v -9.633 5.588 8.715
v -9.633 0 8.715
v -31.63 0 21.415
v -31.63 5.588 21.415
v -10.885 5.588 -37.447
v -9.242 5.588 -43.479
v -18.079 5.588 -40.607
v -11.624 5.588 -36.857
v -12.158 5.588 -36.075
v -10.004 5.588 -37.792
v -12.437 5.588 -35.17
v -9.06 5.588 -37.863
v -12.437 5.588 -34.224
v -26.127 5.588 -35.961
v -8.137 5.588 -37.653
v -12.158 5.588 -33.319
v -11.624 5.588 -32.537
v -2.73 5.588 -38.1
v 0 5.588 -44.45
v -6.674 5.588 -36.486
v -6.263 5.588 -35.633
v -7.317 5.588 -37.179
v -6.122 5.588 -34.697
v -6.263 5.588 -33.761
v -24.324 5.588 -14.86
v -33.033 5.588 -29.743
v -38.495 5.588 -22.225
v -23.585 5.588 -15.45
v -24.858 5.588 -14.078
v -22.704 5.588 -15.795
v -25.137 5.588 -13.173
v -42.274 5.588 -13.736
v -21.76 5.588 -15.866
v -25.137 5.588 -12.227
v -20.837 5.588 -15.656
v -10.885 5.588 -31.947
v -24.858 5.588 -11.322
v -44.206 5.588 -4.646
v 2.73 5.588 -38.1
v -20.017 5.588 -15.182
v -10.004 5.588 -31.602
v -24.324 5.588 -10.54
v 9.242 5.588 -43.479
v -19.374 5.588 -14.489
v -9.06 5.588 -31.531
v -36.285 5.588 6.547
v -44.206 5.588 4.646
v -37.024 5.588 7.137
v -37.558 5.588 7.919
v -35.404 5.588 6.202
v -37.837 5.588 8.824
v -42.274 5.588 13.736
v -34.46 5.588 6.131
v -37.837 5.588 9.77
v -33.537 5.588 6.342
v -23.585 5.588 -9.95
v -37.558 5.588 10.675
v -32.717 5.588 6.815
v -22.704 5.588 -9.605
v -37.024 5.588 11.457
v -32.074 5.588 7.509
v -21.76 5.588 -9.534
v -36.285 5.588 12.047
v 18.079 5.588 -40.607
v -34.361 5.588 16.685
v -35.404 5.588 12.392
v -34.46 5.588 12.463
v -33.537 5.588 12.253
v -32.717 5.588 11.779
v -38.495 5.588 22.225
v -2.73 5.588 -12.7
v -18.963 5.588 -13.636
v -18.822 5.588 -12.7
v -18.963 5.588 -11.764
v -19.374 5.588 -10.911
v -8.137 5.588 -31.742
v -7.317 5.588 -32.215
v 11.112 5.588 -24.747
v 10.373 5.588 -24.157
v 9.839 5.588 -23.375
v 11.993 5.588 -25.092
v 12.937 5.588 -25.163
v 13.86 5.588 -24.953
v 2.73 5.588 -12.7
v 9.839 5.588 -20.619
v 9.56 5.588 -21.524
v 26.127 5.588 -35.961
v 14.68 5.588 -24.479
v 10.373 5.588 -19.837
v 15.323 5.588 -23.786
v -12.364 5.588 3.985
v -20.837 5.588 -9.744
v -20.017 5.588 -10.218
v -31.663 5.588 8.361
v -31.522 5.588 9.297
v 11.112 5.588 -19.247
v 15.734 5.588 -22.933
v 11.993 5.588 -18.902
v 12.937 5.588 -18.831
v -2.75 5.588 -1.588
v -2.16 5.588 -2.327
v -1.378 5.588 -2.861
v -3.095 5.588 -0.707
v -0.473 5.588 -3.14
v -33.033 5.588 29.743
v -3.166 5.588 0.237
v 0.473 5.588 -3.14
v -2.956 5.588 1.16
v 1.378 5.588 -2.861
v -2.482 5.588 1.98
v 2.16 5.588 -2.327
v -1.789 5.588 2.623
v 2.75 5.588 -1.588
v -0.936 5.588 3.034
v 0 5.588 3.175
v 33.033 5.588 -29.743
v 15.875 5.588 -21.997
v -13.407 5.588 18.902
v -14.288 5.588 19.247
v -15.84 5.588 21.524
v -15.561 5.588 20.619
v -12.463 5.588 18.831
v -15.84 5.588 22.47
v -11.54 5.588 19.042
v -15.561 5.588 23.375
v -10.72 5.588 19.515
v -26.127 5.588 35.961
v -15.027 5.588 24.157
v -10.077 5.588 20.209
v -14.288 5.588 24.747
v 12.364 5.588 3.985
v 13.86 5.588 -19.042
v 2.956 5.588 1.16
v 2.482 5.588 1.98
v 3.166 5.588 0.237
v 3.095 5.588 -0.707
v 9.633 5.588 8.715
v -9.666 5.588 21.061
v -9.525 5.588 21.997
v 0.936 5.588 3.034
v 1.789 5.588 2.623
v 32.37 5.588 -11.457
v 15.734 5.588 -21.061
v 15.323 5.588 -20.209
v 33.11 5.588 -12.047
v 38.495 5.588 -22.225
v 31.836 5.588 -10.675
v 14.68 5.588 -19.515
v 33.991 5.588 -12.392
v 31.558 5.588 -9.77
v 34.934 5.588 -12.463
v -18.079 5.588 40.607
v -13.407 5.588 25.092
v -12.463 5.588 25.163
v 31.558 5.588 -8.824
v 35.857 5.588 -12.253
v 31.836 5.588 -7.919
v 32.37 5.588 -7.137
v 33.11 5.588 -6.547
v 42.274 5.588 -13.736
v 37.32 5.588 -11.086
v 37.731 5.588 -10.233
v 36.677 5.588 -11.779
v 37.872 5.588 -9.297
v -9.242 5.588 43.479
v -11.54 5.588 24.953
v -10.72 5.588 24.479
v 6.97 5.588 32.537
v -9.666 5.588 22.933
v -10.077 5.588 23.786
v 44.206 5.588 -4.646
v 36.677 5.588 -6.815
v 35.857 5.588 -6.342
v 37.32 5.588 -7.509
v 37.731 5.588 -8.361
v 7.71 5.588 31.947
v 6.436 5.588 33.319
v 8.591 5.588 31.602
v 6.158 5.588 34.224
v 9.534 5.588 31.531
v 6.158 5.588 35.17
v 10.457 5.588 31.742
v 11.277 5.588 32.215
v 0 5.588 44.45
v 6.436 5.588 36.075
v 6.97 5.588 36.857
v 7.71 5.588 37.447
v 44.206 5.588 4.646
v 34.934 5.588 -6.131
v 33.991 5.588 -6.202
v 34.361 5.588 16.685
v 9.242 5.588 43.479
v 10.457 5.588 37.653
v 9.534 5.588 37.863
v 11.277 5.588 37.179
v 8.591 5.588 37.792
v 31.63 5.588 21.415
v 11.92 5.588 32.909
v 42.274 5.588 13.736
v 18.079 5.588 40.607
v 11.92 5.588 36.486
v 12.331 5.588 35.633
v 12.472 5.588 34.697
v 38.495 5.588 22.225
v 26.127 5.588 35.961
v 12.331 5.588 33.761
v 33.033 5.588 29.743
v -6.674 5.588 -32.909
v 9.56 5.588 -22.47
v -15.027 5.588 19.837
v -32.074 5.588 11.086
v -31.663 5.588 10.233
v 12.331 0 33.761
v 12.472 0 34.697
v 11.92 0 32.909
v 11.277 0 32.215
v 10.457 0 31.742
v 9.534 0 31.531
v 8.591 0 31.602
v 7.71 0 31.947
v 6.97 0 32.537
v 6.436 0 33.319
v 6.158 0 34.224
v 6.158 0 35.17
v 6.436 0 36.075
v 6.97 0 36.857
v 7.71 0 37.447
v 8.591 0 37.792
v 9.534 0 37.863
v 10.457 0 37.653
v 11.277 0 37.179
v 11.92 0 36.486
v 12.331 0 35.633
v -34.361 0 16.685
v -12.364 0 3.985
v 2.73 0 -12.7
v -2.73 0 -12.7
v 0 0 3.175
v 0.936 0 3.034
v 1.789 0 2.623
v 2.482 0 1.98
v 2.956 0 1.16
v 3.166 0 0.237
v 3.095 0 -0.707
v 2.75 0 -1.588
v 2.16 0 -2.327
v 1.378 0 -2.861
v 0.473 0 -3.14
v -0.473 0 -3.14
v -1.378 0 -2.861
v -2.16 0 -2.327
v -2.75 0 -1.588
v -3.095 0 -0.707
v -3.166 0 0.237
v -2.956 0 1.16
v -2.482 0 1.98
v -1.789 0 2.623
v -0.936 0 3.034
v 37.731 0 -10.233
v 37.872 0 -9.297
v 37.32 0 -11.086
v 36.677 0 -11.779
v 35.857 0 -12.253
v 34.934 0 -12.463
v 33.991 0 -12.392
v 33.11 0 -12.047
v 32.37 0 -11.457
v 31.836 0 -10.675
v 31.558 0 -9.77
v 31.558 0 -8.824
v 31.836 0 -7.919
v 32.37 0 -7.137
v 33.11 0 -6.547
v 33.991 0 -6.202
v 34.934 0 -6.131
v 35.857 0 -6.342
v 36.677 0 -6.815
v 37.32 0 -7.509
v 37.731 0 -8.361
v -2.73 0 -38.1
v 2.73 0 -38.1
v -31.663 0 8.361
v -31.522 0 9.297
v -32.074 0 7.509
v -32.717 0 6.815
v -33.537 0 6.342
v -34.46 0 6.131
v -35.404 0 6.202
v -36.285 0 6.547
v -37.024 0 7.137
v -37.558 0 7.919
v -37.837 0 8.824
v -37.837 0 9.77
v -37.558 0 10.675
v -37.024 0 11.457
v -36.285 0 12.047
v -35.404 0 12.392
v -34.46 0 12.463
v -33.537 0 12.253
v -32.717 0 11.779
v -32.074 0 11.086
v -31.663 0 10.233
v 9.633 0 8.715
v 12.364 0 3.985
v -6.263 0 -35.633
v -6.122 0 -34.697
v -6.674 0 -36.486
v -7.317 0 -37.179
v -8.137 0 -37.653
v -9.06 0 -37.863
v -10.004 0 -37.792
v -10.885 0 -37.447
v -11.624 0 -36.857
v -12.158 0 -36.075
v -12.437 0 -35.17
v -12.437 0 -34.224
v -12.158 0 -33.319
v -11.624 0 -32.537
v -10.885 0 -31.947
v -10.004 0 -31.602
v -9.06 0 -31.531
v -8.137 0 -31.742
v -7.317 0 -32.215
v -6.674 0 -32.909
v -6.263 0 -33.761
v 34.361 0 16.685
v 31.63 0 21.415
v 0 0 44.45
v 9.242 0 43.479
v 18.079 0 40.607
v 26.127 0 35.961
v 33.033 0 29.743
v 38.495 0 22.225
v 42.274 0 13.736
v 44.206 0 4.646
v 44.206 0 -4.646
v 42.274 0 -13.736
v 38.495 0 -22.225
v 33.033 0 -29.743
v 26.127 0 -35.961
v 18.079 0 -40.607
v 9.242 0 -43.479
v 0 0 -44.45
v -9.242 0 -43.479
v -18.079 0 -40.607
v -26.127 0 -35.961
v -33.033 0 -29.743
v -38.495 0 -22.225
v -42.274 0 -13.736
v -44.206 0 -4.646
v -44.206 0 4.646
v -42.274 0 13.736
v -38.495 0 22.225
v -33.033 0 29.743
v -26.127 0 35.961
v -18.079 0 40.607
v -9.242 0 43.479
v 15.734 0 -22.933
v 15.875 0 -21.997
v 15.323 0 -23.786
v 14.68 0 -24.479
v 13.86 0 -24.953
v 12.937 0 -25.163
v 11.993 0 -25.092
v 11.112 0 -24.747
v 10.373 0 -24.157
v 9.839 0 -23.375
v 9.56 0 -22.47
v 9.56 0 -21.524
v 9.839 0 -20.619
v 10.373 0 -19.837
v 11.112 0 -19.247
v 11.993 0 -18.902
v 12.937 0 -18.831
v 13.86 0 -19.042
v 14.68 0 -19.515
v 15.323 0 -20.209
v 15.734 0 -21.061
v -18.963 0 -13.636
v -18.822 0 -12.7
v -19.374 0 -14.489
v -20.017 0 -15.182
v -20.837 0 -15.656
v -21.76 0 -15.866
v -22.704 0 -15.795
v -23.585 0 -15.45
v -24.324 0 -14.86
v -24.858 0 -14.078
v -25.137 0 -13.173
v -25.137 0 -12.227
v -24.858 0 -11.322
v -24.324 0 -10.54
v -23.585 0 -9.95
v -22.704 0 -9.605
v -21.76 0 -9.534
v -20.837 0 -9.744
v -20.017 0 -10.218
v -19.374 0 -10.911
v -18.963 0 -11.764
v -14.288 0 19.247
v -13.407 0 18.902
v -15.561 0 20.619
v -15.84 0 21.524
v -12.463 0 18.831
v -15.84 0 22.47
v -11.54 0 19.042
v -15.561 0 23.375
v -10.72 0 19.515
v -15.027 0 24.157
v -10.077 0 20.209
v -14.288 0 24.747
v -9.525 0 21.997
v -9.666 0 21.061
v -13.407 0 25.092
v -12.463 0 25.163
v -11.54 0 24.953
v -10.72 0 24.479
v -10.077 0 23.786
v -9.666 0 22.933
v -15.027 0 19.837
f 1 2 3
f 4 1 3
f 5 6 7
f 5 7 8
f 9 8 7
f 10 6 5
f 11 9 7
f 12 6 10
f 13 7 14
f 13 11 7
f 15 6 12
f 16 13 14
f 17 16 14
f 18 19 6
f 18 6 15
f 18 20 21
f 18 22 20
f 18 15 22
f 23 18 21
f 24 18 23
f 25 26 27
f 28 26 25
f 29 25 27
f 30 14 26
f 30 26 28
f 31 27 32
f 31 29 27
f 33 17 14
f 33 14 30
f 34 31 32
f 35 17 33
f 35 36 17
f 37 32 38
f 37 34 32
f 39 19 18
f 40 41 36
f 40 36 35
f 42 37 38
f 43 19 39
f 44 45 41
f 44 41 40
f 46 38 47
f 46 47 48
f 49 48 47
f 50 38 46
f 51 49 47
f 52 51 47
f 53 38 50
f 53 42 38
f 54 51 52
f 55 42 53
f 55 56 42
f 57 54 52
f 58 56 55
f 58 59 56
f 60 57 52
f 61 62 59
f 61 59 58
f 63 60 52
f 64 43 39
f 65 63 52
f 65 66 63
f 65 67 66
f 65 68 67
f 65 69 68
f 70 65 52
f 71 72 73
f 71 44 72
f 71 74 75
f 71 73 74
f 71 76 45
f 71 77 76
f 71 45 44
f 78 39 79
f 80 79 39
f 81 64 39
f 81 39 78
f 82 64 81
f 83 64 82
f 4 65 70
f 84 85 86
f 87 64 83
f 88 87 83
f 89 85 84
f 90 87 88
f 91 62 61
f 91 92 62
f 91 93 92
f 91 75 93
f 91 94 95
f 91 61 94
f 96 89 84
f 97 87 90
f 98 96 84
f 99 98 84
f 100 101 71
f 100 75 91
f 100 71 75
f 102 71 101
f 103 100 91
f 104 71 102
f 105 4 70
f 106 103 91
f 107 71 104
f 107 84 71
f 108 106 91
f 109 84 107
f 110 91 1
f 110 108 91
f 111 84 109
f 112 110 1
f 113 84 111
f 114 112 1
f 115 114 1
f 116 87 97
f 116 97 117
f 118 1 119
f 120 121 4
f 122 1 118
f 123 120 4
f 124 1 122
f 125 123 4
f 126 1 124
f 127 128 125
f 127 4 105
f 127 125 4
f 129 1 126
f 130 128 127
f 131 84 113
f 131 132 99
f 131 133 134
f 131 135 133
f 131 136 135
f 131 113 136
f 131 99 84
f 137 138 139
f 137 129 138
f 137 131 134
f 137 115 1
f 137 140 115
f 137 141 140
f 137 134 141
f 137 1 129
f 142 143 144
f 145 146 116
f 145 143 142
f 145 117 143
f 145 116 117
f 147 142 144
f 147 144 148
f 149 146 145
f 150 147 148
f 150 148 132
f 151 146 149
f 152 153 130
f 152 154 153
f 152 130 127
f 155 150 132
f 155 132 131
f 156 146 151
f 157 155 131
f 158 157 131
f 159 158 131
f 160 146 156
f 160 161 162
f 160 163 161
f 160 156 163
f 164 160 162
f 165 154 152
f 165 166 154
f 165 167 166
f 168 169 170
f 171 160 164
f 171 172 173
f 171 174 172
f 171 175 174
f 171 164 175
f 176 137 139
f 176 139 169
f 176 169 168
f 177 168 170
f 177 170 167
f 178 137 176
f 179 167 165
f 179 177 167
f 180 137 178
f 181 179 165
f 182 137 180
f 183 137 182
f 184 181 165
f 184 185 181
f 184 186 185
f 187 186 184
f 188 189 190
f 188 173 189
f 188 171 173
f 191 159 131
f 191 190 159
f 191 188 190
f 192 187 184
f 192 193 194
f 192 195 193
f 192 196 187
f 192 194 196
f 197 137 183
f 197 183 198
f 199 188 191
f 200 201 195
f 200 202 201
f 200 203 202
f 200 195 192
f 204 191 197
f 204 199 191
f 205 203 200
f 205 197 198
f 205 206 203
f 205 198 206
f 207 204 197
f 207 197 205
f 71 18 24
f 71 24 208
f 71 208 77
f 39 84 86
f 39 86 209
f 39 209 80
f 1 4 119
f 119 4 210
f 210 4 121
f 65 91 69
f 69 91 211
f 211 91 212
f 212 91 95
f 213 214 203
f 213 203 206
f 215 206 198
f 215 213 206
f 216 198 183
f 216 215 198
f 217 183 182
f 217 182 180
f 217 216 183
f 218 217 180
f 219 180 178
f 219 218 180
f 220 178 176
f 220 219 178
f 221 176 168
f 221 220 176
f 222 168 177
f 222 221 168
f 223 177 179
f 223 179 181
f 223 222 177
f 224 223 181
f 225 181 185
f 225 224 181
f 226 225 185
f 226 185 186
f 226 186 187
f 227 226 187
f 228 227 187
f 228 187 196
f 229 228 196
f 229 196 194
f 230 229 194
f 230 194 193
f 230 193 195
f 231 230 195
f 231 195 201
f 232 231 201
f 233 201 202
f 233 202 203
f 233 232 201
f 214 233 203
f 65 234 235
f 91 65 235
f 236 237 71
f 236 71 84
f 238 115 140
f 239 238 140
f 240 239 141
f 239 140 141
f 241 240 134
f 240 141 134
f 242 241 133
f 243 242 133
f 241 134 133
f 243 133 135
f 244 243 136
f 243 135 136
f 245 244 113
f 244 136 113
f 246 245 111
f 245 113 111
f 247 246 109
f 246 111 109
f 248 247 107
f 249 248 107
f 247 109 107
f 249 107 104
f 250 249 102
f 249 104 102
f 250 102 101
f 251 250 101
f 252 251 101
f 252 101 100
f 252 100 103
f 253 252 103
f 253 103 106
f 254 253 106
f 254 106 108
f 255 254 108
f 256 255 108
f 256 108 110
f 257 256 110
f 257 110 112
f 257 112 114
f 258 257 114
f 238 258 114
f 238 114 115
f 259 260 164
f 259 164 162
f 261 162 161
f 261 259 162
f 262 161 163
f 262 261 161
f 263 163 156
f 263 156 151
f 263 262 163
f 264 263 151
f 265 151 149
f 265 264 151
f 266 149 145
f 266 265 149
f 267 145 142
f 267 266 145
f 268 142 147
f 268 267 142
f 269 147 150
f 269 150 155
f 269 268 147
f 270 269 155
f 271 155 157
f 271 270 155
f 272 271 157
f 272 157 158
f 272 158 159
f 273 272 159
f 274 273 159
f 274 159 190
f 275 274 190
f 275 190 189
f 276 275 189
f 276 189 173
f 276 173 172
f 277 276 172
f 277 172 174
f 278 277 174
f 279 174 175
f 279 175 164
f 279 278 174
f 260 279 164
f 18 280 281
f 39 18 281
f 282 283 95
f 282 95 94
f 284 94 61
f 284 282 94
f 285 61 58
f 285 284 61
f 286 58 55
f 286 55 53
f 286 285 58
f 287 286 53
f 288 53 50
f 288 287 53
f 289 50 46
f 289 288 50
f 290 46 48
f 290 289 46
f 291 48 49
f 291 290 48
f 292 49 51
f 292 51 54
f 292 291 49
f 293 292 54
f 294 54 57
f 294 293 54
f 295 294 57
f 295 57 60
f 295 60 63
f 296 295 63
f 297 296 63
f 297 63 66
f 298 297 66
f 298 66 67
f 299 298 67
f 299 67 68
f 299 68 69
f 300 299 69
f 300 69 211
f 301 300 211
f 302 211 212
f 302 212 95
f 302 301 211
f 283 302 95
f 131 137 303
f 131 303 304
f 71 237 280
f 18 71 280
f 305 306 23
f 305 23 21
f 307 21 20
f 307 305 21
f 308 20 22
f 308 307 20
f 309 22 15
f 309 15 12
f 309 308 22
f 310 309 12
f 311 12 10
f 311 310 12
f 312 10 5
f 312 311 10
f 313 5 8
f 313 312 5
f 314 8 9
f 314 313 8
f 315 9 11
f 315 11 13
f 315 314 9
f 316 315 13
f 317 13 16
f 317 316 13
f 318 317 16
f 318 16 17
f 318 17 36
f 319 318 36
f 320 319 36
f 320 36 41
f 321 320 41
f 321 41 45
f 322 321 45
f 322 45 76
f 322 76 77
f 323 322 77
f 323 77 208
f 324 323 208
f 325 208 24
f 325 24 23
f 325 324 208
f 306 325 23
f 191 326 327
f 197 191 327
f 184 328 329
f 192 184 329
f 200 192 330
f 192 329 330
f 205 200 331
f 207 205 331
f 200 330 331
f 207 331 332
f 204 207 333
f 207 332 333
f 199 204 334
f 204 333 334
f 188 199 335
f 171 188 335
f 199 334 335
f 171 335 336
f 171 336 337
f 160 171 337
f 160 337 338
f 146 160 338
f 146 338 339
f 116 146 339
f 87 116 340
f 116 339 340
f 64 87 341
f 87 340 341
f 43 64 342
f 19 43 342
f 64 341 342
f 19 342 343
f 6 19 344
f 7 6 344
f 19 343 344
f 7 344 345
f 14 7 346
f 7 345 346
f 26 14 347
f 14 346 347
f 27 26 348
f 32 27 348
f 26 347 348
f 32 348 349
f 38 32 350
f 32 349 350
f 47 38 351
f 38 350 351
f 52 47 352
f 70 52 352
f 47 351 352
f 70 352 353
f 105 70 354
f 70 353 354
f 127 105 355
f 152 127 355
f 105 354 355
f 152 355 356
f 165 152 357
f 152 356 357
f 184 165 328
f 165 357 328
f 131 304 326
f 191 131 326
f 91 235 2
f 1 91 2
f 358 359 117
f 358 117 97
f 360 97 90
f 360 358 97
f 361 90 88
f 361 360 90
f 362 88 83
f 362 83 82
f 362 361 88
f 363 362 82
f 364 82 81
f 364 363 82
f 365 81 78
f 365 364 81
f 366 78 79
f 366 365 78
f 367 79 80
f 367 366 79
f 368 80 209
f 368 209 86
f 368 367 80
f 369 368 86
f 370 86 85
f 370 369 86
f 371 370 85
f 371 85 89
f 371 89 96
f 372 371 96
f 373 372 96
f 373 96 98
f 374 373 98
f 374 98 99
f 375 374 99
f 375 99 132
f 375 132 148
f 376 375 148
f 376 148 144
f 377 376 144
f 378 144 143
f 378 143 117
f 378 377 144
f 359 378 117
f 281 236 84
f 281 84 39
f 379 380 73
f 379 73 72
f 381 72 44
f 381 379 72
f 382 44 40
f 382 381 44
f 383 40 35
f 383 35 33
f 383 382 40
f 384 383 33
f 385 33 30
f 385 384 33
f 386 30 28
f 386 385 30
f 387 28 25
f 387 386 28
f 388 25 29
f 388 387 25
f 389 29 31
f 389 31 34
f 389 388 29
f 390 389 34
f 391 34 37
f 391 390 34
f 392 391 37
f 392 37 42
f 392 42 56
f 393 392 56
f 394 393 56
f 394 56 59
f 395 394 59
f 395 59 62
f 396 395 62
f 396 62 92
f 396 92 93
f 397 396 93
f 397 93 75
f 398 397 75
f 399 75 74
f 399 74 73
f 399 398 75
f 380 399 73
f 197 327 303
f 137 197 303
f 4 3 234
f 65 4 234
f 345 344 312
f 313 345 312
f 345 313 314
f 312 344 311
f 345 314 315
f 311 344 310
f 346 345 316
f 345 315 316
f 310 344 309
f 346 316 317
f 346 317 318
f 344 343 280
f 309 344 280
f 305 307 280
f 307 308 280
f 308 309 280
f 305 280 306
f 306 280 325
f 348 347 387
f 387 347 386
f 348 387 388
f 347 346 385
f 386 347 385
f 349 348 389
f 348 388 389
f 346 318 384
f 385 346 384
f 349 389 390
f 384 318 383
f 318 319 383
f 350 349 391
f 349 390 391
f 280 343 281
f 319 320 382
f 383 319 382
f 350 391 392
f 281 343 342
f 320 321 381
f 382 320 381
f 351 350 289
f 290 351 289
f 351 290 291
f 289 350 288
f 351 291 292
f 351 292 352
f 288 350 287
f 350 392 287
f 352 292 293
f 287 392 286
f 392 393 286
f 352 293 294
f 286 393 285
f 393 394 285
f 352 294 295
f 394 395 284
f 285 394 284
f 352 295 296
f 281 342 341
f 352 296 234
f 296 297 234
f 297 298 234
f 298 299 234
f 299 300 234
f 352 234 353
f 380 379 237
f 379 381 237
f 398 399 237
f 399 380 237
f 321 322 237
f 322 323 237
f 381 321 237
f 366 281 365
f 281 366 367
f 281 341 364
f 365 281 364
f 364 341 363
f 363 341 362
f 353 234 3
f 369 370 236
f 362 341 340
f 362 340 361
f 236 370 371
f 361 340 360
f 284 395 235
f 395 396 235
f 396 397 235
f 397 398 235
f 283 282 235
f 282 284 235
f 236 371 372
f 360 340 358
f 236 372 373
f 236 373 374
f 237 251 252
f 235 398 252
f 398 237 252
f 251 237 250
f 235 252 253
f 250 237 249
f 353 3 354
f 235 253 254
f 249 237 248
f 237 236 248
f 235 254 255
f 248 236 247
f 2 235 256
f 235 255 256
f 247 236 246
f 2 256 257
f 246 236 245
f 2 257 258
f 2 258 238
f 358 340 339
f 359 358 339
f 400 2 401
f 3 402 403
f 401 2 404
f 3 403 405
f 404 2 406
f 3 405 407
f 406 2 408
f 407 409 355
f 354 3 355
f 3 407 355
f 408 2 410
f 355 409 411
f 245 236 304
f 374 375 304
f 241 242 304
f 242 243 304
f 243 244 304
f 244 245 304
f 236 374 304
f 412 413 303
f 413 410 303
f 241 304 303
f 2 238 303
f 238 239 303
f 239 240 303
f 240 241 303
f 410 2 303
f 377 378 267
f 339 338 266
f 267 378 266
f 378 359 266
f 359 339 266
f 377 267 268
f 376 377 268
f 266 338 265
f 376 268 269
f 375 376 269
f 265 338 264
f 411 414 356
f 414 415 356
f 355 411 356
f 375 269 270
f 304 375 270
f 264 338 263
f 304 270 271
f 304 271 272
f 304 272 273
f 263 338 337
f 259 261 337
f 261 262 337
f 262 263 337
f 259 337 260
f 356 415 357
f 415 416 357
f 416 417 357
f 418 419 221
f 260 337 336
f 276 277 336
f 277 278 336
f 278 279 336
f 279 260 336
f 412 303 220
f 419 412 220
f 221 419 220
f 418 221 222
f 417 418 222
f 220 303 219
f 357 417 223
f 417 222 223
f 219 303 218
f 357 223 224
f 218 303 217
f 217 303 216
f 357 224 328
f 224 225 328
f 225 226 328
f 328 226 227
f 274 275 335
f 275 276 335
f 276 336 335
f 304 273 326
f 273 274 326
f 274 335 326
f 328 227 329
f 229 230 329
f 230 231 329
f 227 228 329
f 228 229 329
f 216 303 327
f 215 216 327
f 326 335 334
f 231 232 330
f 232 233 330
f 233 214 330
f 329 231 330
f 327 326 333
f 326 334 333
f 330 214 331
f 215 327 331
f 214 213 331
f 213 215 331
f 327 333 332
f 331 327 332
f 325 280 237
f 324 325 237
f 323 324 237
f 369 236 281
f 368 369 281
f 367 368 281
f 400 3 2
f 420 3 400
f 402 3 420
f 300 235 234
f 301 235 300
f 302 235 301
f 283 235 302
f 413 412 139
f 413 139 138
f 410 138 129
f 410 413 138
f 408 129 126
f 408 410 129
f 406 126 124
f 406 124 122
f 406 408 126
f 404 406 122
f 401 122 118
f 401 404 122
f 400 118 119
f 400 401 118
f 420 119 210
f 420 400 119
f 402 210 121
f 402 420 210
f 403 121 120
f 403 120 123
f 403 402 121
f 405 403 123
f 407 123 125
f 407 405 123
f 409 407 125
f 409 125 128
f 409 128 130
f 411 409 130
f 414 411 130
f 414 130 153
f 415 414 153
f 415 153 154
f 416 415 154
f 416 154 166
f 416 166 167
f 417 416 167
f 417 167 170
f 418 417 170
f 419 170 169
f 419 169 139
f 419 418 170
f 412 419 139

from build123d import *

# Parameters (mm, degrees)
SKETCH2_R               = 44.45
SKETCH2_W               = 5.461
SKETCH2_H               = 25.4
BOSS_EXTRUDE1_DEPTH     = 5.588
SKETCH3_R               = 3.175
CUT_EXTRUDE1_DEPTH      = 64.109672349
FILL_PATTERN1_OUTLINE_R = 3.175
FILL_PATTERN1_DEPTH     = 5.588


# Read off the part's stored shape, not the designer's step: Fill Pattern1
with BuildPart() as part:
    # Sketch2 → Boss-Extrude1 (new body)
    with BuildSketch(Plane(origin=(0, 0, 0), x_dir=(1, 0, 0), z_dir=(0, 1, 0))):
        with Locations(Location((0, 0, 0), (0, 0, 270))):
            Circle(SKETCH2_R)
        with Locations((0, 25.4)):
            Rectangle(SKETCH2_W, SKETCH2_H, mode=Mode.SUBTRACT)
        Polygon((34.360817884, -16.685317635), (31.630317884, -21.414682365), (9.633272628, -8.714682365), (12.363772628, -3.985317635), align=None, mode=Mode.SUBTRACT)
        Polygon((-31.630317884, -21.414682365), (-34.360817884, -16.685317635), (-12.363772628, -3.985317635), (-9.633272628, -8.714682365), align=None, mode=Mode.SUBTRACT)
    extrude(amount=BOSS_EXTRUDE1_DEPTH)

    # Sketch3 → Cut-Extrude1 (cut, through all)
    with BuildSketch(Plane(origin=(0, 5.588, 0), x_dir=(1, 0, 0), z_dir=(0, 1, 0))):
        with Locations(Location((0, 0, 0), (0, 0, 270))):
            Circle(SKETCH3_R)
    extrude(amount=-CUT_EXTRUDE1_DEPTH, mode=Mode.SUBTRACT)

    # Fill Pattern1 outline → Fill Pattern1 (cut)
    with BuildSketch(Plane(origin=(0, 0, 0), x_dir=(1, 0, 0), z_dir=(0, 1, 0))):
        with Locations((34.697045256, 9.297045256)):
            Circle(FILL_PATTERN1_OUTLINE_R)
        with Locations((9.297045256, -34.697045256)):
            Circle(FILL_PATTERN1_OUTLINE_R)
        with Locations((-12.7, -21.997045256)):
            Circle(FILL_PATTERN1_OUTLINE_R)
        with Locations((-34.697045256, -9.297045256)):
            Circle(FILL_PATTERN1_OUTLINE_R)
        with Locations((-21.997045256, 12.7)):
            Circle(FILL_PATTERN1_OUTLINE_R)
        with Locations((-9.297045256, 34.697045256)):
            Circle(FILL_PATTERN1_OUTLINE_R)
        with Locations((12.7, 21.997045256)):
            Circle(FILL_PATTERN1_OUTLINE_R)
    extrude(amount=FILL_PATTERN1_DEPTH, mode=Mode.SUBTRACT)


solid = part.part
